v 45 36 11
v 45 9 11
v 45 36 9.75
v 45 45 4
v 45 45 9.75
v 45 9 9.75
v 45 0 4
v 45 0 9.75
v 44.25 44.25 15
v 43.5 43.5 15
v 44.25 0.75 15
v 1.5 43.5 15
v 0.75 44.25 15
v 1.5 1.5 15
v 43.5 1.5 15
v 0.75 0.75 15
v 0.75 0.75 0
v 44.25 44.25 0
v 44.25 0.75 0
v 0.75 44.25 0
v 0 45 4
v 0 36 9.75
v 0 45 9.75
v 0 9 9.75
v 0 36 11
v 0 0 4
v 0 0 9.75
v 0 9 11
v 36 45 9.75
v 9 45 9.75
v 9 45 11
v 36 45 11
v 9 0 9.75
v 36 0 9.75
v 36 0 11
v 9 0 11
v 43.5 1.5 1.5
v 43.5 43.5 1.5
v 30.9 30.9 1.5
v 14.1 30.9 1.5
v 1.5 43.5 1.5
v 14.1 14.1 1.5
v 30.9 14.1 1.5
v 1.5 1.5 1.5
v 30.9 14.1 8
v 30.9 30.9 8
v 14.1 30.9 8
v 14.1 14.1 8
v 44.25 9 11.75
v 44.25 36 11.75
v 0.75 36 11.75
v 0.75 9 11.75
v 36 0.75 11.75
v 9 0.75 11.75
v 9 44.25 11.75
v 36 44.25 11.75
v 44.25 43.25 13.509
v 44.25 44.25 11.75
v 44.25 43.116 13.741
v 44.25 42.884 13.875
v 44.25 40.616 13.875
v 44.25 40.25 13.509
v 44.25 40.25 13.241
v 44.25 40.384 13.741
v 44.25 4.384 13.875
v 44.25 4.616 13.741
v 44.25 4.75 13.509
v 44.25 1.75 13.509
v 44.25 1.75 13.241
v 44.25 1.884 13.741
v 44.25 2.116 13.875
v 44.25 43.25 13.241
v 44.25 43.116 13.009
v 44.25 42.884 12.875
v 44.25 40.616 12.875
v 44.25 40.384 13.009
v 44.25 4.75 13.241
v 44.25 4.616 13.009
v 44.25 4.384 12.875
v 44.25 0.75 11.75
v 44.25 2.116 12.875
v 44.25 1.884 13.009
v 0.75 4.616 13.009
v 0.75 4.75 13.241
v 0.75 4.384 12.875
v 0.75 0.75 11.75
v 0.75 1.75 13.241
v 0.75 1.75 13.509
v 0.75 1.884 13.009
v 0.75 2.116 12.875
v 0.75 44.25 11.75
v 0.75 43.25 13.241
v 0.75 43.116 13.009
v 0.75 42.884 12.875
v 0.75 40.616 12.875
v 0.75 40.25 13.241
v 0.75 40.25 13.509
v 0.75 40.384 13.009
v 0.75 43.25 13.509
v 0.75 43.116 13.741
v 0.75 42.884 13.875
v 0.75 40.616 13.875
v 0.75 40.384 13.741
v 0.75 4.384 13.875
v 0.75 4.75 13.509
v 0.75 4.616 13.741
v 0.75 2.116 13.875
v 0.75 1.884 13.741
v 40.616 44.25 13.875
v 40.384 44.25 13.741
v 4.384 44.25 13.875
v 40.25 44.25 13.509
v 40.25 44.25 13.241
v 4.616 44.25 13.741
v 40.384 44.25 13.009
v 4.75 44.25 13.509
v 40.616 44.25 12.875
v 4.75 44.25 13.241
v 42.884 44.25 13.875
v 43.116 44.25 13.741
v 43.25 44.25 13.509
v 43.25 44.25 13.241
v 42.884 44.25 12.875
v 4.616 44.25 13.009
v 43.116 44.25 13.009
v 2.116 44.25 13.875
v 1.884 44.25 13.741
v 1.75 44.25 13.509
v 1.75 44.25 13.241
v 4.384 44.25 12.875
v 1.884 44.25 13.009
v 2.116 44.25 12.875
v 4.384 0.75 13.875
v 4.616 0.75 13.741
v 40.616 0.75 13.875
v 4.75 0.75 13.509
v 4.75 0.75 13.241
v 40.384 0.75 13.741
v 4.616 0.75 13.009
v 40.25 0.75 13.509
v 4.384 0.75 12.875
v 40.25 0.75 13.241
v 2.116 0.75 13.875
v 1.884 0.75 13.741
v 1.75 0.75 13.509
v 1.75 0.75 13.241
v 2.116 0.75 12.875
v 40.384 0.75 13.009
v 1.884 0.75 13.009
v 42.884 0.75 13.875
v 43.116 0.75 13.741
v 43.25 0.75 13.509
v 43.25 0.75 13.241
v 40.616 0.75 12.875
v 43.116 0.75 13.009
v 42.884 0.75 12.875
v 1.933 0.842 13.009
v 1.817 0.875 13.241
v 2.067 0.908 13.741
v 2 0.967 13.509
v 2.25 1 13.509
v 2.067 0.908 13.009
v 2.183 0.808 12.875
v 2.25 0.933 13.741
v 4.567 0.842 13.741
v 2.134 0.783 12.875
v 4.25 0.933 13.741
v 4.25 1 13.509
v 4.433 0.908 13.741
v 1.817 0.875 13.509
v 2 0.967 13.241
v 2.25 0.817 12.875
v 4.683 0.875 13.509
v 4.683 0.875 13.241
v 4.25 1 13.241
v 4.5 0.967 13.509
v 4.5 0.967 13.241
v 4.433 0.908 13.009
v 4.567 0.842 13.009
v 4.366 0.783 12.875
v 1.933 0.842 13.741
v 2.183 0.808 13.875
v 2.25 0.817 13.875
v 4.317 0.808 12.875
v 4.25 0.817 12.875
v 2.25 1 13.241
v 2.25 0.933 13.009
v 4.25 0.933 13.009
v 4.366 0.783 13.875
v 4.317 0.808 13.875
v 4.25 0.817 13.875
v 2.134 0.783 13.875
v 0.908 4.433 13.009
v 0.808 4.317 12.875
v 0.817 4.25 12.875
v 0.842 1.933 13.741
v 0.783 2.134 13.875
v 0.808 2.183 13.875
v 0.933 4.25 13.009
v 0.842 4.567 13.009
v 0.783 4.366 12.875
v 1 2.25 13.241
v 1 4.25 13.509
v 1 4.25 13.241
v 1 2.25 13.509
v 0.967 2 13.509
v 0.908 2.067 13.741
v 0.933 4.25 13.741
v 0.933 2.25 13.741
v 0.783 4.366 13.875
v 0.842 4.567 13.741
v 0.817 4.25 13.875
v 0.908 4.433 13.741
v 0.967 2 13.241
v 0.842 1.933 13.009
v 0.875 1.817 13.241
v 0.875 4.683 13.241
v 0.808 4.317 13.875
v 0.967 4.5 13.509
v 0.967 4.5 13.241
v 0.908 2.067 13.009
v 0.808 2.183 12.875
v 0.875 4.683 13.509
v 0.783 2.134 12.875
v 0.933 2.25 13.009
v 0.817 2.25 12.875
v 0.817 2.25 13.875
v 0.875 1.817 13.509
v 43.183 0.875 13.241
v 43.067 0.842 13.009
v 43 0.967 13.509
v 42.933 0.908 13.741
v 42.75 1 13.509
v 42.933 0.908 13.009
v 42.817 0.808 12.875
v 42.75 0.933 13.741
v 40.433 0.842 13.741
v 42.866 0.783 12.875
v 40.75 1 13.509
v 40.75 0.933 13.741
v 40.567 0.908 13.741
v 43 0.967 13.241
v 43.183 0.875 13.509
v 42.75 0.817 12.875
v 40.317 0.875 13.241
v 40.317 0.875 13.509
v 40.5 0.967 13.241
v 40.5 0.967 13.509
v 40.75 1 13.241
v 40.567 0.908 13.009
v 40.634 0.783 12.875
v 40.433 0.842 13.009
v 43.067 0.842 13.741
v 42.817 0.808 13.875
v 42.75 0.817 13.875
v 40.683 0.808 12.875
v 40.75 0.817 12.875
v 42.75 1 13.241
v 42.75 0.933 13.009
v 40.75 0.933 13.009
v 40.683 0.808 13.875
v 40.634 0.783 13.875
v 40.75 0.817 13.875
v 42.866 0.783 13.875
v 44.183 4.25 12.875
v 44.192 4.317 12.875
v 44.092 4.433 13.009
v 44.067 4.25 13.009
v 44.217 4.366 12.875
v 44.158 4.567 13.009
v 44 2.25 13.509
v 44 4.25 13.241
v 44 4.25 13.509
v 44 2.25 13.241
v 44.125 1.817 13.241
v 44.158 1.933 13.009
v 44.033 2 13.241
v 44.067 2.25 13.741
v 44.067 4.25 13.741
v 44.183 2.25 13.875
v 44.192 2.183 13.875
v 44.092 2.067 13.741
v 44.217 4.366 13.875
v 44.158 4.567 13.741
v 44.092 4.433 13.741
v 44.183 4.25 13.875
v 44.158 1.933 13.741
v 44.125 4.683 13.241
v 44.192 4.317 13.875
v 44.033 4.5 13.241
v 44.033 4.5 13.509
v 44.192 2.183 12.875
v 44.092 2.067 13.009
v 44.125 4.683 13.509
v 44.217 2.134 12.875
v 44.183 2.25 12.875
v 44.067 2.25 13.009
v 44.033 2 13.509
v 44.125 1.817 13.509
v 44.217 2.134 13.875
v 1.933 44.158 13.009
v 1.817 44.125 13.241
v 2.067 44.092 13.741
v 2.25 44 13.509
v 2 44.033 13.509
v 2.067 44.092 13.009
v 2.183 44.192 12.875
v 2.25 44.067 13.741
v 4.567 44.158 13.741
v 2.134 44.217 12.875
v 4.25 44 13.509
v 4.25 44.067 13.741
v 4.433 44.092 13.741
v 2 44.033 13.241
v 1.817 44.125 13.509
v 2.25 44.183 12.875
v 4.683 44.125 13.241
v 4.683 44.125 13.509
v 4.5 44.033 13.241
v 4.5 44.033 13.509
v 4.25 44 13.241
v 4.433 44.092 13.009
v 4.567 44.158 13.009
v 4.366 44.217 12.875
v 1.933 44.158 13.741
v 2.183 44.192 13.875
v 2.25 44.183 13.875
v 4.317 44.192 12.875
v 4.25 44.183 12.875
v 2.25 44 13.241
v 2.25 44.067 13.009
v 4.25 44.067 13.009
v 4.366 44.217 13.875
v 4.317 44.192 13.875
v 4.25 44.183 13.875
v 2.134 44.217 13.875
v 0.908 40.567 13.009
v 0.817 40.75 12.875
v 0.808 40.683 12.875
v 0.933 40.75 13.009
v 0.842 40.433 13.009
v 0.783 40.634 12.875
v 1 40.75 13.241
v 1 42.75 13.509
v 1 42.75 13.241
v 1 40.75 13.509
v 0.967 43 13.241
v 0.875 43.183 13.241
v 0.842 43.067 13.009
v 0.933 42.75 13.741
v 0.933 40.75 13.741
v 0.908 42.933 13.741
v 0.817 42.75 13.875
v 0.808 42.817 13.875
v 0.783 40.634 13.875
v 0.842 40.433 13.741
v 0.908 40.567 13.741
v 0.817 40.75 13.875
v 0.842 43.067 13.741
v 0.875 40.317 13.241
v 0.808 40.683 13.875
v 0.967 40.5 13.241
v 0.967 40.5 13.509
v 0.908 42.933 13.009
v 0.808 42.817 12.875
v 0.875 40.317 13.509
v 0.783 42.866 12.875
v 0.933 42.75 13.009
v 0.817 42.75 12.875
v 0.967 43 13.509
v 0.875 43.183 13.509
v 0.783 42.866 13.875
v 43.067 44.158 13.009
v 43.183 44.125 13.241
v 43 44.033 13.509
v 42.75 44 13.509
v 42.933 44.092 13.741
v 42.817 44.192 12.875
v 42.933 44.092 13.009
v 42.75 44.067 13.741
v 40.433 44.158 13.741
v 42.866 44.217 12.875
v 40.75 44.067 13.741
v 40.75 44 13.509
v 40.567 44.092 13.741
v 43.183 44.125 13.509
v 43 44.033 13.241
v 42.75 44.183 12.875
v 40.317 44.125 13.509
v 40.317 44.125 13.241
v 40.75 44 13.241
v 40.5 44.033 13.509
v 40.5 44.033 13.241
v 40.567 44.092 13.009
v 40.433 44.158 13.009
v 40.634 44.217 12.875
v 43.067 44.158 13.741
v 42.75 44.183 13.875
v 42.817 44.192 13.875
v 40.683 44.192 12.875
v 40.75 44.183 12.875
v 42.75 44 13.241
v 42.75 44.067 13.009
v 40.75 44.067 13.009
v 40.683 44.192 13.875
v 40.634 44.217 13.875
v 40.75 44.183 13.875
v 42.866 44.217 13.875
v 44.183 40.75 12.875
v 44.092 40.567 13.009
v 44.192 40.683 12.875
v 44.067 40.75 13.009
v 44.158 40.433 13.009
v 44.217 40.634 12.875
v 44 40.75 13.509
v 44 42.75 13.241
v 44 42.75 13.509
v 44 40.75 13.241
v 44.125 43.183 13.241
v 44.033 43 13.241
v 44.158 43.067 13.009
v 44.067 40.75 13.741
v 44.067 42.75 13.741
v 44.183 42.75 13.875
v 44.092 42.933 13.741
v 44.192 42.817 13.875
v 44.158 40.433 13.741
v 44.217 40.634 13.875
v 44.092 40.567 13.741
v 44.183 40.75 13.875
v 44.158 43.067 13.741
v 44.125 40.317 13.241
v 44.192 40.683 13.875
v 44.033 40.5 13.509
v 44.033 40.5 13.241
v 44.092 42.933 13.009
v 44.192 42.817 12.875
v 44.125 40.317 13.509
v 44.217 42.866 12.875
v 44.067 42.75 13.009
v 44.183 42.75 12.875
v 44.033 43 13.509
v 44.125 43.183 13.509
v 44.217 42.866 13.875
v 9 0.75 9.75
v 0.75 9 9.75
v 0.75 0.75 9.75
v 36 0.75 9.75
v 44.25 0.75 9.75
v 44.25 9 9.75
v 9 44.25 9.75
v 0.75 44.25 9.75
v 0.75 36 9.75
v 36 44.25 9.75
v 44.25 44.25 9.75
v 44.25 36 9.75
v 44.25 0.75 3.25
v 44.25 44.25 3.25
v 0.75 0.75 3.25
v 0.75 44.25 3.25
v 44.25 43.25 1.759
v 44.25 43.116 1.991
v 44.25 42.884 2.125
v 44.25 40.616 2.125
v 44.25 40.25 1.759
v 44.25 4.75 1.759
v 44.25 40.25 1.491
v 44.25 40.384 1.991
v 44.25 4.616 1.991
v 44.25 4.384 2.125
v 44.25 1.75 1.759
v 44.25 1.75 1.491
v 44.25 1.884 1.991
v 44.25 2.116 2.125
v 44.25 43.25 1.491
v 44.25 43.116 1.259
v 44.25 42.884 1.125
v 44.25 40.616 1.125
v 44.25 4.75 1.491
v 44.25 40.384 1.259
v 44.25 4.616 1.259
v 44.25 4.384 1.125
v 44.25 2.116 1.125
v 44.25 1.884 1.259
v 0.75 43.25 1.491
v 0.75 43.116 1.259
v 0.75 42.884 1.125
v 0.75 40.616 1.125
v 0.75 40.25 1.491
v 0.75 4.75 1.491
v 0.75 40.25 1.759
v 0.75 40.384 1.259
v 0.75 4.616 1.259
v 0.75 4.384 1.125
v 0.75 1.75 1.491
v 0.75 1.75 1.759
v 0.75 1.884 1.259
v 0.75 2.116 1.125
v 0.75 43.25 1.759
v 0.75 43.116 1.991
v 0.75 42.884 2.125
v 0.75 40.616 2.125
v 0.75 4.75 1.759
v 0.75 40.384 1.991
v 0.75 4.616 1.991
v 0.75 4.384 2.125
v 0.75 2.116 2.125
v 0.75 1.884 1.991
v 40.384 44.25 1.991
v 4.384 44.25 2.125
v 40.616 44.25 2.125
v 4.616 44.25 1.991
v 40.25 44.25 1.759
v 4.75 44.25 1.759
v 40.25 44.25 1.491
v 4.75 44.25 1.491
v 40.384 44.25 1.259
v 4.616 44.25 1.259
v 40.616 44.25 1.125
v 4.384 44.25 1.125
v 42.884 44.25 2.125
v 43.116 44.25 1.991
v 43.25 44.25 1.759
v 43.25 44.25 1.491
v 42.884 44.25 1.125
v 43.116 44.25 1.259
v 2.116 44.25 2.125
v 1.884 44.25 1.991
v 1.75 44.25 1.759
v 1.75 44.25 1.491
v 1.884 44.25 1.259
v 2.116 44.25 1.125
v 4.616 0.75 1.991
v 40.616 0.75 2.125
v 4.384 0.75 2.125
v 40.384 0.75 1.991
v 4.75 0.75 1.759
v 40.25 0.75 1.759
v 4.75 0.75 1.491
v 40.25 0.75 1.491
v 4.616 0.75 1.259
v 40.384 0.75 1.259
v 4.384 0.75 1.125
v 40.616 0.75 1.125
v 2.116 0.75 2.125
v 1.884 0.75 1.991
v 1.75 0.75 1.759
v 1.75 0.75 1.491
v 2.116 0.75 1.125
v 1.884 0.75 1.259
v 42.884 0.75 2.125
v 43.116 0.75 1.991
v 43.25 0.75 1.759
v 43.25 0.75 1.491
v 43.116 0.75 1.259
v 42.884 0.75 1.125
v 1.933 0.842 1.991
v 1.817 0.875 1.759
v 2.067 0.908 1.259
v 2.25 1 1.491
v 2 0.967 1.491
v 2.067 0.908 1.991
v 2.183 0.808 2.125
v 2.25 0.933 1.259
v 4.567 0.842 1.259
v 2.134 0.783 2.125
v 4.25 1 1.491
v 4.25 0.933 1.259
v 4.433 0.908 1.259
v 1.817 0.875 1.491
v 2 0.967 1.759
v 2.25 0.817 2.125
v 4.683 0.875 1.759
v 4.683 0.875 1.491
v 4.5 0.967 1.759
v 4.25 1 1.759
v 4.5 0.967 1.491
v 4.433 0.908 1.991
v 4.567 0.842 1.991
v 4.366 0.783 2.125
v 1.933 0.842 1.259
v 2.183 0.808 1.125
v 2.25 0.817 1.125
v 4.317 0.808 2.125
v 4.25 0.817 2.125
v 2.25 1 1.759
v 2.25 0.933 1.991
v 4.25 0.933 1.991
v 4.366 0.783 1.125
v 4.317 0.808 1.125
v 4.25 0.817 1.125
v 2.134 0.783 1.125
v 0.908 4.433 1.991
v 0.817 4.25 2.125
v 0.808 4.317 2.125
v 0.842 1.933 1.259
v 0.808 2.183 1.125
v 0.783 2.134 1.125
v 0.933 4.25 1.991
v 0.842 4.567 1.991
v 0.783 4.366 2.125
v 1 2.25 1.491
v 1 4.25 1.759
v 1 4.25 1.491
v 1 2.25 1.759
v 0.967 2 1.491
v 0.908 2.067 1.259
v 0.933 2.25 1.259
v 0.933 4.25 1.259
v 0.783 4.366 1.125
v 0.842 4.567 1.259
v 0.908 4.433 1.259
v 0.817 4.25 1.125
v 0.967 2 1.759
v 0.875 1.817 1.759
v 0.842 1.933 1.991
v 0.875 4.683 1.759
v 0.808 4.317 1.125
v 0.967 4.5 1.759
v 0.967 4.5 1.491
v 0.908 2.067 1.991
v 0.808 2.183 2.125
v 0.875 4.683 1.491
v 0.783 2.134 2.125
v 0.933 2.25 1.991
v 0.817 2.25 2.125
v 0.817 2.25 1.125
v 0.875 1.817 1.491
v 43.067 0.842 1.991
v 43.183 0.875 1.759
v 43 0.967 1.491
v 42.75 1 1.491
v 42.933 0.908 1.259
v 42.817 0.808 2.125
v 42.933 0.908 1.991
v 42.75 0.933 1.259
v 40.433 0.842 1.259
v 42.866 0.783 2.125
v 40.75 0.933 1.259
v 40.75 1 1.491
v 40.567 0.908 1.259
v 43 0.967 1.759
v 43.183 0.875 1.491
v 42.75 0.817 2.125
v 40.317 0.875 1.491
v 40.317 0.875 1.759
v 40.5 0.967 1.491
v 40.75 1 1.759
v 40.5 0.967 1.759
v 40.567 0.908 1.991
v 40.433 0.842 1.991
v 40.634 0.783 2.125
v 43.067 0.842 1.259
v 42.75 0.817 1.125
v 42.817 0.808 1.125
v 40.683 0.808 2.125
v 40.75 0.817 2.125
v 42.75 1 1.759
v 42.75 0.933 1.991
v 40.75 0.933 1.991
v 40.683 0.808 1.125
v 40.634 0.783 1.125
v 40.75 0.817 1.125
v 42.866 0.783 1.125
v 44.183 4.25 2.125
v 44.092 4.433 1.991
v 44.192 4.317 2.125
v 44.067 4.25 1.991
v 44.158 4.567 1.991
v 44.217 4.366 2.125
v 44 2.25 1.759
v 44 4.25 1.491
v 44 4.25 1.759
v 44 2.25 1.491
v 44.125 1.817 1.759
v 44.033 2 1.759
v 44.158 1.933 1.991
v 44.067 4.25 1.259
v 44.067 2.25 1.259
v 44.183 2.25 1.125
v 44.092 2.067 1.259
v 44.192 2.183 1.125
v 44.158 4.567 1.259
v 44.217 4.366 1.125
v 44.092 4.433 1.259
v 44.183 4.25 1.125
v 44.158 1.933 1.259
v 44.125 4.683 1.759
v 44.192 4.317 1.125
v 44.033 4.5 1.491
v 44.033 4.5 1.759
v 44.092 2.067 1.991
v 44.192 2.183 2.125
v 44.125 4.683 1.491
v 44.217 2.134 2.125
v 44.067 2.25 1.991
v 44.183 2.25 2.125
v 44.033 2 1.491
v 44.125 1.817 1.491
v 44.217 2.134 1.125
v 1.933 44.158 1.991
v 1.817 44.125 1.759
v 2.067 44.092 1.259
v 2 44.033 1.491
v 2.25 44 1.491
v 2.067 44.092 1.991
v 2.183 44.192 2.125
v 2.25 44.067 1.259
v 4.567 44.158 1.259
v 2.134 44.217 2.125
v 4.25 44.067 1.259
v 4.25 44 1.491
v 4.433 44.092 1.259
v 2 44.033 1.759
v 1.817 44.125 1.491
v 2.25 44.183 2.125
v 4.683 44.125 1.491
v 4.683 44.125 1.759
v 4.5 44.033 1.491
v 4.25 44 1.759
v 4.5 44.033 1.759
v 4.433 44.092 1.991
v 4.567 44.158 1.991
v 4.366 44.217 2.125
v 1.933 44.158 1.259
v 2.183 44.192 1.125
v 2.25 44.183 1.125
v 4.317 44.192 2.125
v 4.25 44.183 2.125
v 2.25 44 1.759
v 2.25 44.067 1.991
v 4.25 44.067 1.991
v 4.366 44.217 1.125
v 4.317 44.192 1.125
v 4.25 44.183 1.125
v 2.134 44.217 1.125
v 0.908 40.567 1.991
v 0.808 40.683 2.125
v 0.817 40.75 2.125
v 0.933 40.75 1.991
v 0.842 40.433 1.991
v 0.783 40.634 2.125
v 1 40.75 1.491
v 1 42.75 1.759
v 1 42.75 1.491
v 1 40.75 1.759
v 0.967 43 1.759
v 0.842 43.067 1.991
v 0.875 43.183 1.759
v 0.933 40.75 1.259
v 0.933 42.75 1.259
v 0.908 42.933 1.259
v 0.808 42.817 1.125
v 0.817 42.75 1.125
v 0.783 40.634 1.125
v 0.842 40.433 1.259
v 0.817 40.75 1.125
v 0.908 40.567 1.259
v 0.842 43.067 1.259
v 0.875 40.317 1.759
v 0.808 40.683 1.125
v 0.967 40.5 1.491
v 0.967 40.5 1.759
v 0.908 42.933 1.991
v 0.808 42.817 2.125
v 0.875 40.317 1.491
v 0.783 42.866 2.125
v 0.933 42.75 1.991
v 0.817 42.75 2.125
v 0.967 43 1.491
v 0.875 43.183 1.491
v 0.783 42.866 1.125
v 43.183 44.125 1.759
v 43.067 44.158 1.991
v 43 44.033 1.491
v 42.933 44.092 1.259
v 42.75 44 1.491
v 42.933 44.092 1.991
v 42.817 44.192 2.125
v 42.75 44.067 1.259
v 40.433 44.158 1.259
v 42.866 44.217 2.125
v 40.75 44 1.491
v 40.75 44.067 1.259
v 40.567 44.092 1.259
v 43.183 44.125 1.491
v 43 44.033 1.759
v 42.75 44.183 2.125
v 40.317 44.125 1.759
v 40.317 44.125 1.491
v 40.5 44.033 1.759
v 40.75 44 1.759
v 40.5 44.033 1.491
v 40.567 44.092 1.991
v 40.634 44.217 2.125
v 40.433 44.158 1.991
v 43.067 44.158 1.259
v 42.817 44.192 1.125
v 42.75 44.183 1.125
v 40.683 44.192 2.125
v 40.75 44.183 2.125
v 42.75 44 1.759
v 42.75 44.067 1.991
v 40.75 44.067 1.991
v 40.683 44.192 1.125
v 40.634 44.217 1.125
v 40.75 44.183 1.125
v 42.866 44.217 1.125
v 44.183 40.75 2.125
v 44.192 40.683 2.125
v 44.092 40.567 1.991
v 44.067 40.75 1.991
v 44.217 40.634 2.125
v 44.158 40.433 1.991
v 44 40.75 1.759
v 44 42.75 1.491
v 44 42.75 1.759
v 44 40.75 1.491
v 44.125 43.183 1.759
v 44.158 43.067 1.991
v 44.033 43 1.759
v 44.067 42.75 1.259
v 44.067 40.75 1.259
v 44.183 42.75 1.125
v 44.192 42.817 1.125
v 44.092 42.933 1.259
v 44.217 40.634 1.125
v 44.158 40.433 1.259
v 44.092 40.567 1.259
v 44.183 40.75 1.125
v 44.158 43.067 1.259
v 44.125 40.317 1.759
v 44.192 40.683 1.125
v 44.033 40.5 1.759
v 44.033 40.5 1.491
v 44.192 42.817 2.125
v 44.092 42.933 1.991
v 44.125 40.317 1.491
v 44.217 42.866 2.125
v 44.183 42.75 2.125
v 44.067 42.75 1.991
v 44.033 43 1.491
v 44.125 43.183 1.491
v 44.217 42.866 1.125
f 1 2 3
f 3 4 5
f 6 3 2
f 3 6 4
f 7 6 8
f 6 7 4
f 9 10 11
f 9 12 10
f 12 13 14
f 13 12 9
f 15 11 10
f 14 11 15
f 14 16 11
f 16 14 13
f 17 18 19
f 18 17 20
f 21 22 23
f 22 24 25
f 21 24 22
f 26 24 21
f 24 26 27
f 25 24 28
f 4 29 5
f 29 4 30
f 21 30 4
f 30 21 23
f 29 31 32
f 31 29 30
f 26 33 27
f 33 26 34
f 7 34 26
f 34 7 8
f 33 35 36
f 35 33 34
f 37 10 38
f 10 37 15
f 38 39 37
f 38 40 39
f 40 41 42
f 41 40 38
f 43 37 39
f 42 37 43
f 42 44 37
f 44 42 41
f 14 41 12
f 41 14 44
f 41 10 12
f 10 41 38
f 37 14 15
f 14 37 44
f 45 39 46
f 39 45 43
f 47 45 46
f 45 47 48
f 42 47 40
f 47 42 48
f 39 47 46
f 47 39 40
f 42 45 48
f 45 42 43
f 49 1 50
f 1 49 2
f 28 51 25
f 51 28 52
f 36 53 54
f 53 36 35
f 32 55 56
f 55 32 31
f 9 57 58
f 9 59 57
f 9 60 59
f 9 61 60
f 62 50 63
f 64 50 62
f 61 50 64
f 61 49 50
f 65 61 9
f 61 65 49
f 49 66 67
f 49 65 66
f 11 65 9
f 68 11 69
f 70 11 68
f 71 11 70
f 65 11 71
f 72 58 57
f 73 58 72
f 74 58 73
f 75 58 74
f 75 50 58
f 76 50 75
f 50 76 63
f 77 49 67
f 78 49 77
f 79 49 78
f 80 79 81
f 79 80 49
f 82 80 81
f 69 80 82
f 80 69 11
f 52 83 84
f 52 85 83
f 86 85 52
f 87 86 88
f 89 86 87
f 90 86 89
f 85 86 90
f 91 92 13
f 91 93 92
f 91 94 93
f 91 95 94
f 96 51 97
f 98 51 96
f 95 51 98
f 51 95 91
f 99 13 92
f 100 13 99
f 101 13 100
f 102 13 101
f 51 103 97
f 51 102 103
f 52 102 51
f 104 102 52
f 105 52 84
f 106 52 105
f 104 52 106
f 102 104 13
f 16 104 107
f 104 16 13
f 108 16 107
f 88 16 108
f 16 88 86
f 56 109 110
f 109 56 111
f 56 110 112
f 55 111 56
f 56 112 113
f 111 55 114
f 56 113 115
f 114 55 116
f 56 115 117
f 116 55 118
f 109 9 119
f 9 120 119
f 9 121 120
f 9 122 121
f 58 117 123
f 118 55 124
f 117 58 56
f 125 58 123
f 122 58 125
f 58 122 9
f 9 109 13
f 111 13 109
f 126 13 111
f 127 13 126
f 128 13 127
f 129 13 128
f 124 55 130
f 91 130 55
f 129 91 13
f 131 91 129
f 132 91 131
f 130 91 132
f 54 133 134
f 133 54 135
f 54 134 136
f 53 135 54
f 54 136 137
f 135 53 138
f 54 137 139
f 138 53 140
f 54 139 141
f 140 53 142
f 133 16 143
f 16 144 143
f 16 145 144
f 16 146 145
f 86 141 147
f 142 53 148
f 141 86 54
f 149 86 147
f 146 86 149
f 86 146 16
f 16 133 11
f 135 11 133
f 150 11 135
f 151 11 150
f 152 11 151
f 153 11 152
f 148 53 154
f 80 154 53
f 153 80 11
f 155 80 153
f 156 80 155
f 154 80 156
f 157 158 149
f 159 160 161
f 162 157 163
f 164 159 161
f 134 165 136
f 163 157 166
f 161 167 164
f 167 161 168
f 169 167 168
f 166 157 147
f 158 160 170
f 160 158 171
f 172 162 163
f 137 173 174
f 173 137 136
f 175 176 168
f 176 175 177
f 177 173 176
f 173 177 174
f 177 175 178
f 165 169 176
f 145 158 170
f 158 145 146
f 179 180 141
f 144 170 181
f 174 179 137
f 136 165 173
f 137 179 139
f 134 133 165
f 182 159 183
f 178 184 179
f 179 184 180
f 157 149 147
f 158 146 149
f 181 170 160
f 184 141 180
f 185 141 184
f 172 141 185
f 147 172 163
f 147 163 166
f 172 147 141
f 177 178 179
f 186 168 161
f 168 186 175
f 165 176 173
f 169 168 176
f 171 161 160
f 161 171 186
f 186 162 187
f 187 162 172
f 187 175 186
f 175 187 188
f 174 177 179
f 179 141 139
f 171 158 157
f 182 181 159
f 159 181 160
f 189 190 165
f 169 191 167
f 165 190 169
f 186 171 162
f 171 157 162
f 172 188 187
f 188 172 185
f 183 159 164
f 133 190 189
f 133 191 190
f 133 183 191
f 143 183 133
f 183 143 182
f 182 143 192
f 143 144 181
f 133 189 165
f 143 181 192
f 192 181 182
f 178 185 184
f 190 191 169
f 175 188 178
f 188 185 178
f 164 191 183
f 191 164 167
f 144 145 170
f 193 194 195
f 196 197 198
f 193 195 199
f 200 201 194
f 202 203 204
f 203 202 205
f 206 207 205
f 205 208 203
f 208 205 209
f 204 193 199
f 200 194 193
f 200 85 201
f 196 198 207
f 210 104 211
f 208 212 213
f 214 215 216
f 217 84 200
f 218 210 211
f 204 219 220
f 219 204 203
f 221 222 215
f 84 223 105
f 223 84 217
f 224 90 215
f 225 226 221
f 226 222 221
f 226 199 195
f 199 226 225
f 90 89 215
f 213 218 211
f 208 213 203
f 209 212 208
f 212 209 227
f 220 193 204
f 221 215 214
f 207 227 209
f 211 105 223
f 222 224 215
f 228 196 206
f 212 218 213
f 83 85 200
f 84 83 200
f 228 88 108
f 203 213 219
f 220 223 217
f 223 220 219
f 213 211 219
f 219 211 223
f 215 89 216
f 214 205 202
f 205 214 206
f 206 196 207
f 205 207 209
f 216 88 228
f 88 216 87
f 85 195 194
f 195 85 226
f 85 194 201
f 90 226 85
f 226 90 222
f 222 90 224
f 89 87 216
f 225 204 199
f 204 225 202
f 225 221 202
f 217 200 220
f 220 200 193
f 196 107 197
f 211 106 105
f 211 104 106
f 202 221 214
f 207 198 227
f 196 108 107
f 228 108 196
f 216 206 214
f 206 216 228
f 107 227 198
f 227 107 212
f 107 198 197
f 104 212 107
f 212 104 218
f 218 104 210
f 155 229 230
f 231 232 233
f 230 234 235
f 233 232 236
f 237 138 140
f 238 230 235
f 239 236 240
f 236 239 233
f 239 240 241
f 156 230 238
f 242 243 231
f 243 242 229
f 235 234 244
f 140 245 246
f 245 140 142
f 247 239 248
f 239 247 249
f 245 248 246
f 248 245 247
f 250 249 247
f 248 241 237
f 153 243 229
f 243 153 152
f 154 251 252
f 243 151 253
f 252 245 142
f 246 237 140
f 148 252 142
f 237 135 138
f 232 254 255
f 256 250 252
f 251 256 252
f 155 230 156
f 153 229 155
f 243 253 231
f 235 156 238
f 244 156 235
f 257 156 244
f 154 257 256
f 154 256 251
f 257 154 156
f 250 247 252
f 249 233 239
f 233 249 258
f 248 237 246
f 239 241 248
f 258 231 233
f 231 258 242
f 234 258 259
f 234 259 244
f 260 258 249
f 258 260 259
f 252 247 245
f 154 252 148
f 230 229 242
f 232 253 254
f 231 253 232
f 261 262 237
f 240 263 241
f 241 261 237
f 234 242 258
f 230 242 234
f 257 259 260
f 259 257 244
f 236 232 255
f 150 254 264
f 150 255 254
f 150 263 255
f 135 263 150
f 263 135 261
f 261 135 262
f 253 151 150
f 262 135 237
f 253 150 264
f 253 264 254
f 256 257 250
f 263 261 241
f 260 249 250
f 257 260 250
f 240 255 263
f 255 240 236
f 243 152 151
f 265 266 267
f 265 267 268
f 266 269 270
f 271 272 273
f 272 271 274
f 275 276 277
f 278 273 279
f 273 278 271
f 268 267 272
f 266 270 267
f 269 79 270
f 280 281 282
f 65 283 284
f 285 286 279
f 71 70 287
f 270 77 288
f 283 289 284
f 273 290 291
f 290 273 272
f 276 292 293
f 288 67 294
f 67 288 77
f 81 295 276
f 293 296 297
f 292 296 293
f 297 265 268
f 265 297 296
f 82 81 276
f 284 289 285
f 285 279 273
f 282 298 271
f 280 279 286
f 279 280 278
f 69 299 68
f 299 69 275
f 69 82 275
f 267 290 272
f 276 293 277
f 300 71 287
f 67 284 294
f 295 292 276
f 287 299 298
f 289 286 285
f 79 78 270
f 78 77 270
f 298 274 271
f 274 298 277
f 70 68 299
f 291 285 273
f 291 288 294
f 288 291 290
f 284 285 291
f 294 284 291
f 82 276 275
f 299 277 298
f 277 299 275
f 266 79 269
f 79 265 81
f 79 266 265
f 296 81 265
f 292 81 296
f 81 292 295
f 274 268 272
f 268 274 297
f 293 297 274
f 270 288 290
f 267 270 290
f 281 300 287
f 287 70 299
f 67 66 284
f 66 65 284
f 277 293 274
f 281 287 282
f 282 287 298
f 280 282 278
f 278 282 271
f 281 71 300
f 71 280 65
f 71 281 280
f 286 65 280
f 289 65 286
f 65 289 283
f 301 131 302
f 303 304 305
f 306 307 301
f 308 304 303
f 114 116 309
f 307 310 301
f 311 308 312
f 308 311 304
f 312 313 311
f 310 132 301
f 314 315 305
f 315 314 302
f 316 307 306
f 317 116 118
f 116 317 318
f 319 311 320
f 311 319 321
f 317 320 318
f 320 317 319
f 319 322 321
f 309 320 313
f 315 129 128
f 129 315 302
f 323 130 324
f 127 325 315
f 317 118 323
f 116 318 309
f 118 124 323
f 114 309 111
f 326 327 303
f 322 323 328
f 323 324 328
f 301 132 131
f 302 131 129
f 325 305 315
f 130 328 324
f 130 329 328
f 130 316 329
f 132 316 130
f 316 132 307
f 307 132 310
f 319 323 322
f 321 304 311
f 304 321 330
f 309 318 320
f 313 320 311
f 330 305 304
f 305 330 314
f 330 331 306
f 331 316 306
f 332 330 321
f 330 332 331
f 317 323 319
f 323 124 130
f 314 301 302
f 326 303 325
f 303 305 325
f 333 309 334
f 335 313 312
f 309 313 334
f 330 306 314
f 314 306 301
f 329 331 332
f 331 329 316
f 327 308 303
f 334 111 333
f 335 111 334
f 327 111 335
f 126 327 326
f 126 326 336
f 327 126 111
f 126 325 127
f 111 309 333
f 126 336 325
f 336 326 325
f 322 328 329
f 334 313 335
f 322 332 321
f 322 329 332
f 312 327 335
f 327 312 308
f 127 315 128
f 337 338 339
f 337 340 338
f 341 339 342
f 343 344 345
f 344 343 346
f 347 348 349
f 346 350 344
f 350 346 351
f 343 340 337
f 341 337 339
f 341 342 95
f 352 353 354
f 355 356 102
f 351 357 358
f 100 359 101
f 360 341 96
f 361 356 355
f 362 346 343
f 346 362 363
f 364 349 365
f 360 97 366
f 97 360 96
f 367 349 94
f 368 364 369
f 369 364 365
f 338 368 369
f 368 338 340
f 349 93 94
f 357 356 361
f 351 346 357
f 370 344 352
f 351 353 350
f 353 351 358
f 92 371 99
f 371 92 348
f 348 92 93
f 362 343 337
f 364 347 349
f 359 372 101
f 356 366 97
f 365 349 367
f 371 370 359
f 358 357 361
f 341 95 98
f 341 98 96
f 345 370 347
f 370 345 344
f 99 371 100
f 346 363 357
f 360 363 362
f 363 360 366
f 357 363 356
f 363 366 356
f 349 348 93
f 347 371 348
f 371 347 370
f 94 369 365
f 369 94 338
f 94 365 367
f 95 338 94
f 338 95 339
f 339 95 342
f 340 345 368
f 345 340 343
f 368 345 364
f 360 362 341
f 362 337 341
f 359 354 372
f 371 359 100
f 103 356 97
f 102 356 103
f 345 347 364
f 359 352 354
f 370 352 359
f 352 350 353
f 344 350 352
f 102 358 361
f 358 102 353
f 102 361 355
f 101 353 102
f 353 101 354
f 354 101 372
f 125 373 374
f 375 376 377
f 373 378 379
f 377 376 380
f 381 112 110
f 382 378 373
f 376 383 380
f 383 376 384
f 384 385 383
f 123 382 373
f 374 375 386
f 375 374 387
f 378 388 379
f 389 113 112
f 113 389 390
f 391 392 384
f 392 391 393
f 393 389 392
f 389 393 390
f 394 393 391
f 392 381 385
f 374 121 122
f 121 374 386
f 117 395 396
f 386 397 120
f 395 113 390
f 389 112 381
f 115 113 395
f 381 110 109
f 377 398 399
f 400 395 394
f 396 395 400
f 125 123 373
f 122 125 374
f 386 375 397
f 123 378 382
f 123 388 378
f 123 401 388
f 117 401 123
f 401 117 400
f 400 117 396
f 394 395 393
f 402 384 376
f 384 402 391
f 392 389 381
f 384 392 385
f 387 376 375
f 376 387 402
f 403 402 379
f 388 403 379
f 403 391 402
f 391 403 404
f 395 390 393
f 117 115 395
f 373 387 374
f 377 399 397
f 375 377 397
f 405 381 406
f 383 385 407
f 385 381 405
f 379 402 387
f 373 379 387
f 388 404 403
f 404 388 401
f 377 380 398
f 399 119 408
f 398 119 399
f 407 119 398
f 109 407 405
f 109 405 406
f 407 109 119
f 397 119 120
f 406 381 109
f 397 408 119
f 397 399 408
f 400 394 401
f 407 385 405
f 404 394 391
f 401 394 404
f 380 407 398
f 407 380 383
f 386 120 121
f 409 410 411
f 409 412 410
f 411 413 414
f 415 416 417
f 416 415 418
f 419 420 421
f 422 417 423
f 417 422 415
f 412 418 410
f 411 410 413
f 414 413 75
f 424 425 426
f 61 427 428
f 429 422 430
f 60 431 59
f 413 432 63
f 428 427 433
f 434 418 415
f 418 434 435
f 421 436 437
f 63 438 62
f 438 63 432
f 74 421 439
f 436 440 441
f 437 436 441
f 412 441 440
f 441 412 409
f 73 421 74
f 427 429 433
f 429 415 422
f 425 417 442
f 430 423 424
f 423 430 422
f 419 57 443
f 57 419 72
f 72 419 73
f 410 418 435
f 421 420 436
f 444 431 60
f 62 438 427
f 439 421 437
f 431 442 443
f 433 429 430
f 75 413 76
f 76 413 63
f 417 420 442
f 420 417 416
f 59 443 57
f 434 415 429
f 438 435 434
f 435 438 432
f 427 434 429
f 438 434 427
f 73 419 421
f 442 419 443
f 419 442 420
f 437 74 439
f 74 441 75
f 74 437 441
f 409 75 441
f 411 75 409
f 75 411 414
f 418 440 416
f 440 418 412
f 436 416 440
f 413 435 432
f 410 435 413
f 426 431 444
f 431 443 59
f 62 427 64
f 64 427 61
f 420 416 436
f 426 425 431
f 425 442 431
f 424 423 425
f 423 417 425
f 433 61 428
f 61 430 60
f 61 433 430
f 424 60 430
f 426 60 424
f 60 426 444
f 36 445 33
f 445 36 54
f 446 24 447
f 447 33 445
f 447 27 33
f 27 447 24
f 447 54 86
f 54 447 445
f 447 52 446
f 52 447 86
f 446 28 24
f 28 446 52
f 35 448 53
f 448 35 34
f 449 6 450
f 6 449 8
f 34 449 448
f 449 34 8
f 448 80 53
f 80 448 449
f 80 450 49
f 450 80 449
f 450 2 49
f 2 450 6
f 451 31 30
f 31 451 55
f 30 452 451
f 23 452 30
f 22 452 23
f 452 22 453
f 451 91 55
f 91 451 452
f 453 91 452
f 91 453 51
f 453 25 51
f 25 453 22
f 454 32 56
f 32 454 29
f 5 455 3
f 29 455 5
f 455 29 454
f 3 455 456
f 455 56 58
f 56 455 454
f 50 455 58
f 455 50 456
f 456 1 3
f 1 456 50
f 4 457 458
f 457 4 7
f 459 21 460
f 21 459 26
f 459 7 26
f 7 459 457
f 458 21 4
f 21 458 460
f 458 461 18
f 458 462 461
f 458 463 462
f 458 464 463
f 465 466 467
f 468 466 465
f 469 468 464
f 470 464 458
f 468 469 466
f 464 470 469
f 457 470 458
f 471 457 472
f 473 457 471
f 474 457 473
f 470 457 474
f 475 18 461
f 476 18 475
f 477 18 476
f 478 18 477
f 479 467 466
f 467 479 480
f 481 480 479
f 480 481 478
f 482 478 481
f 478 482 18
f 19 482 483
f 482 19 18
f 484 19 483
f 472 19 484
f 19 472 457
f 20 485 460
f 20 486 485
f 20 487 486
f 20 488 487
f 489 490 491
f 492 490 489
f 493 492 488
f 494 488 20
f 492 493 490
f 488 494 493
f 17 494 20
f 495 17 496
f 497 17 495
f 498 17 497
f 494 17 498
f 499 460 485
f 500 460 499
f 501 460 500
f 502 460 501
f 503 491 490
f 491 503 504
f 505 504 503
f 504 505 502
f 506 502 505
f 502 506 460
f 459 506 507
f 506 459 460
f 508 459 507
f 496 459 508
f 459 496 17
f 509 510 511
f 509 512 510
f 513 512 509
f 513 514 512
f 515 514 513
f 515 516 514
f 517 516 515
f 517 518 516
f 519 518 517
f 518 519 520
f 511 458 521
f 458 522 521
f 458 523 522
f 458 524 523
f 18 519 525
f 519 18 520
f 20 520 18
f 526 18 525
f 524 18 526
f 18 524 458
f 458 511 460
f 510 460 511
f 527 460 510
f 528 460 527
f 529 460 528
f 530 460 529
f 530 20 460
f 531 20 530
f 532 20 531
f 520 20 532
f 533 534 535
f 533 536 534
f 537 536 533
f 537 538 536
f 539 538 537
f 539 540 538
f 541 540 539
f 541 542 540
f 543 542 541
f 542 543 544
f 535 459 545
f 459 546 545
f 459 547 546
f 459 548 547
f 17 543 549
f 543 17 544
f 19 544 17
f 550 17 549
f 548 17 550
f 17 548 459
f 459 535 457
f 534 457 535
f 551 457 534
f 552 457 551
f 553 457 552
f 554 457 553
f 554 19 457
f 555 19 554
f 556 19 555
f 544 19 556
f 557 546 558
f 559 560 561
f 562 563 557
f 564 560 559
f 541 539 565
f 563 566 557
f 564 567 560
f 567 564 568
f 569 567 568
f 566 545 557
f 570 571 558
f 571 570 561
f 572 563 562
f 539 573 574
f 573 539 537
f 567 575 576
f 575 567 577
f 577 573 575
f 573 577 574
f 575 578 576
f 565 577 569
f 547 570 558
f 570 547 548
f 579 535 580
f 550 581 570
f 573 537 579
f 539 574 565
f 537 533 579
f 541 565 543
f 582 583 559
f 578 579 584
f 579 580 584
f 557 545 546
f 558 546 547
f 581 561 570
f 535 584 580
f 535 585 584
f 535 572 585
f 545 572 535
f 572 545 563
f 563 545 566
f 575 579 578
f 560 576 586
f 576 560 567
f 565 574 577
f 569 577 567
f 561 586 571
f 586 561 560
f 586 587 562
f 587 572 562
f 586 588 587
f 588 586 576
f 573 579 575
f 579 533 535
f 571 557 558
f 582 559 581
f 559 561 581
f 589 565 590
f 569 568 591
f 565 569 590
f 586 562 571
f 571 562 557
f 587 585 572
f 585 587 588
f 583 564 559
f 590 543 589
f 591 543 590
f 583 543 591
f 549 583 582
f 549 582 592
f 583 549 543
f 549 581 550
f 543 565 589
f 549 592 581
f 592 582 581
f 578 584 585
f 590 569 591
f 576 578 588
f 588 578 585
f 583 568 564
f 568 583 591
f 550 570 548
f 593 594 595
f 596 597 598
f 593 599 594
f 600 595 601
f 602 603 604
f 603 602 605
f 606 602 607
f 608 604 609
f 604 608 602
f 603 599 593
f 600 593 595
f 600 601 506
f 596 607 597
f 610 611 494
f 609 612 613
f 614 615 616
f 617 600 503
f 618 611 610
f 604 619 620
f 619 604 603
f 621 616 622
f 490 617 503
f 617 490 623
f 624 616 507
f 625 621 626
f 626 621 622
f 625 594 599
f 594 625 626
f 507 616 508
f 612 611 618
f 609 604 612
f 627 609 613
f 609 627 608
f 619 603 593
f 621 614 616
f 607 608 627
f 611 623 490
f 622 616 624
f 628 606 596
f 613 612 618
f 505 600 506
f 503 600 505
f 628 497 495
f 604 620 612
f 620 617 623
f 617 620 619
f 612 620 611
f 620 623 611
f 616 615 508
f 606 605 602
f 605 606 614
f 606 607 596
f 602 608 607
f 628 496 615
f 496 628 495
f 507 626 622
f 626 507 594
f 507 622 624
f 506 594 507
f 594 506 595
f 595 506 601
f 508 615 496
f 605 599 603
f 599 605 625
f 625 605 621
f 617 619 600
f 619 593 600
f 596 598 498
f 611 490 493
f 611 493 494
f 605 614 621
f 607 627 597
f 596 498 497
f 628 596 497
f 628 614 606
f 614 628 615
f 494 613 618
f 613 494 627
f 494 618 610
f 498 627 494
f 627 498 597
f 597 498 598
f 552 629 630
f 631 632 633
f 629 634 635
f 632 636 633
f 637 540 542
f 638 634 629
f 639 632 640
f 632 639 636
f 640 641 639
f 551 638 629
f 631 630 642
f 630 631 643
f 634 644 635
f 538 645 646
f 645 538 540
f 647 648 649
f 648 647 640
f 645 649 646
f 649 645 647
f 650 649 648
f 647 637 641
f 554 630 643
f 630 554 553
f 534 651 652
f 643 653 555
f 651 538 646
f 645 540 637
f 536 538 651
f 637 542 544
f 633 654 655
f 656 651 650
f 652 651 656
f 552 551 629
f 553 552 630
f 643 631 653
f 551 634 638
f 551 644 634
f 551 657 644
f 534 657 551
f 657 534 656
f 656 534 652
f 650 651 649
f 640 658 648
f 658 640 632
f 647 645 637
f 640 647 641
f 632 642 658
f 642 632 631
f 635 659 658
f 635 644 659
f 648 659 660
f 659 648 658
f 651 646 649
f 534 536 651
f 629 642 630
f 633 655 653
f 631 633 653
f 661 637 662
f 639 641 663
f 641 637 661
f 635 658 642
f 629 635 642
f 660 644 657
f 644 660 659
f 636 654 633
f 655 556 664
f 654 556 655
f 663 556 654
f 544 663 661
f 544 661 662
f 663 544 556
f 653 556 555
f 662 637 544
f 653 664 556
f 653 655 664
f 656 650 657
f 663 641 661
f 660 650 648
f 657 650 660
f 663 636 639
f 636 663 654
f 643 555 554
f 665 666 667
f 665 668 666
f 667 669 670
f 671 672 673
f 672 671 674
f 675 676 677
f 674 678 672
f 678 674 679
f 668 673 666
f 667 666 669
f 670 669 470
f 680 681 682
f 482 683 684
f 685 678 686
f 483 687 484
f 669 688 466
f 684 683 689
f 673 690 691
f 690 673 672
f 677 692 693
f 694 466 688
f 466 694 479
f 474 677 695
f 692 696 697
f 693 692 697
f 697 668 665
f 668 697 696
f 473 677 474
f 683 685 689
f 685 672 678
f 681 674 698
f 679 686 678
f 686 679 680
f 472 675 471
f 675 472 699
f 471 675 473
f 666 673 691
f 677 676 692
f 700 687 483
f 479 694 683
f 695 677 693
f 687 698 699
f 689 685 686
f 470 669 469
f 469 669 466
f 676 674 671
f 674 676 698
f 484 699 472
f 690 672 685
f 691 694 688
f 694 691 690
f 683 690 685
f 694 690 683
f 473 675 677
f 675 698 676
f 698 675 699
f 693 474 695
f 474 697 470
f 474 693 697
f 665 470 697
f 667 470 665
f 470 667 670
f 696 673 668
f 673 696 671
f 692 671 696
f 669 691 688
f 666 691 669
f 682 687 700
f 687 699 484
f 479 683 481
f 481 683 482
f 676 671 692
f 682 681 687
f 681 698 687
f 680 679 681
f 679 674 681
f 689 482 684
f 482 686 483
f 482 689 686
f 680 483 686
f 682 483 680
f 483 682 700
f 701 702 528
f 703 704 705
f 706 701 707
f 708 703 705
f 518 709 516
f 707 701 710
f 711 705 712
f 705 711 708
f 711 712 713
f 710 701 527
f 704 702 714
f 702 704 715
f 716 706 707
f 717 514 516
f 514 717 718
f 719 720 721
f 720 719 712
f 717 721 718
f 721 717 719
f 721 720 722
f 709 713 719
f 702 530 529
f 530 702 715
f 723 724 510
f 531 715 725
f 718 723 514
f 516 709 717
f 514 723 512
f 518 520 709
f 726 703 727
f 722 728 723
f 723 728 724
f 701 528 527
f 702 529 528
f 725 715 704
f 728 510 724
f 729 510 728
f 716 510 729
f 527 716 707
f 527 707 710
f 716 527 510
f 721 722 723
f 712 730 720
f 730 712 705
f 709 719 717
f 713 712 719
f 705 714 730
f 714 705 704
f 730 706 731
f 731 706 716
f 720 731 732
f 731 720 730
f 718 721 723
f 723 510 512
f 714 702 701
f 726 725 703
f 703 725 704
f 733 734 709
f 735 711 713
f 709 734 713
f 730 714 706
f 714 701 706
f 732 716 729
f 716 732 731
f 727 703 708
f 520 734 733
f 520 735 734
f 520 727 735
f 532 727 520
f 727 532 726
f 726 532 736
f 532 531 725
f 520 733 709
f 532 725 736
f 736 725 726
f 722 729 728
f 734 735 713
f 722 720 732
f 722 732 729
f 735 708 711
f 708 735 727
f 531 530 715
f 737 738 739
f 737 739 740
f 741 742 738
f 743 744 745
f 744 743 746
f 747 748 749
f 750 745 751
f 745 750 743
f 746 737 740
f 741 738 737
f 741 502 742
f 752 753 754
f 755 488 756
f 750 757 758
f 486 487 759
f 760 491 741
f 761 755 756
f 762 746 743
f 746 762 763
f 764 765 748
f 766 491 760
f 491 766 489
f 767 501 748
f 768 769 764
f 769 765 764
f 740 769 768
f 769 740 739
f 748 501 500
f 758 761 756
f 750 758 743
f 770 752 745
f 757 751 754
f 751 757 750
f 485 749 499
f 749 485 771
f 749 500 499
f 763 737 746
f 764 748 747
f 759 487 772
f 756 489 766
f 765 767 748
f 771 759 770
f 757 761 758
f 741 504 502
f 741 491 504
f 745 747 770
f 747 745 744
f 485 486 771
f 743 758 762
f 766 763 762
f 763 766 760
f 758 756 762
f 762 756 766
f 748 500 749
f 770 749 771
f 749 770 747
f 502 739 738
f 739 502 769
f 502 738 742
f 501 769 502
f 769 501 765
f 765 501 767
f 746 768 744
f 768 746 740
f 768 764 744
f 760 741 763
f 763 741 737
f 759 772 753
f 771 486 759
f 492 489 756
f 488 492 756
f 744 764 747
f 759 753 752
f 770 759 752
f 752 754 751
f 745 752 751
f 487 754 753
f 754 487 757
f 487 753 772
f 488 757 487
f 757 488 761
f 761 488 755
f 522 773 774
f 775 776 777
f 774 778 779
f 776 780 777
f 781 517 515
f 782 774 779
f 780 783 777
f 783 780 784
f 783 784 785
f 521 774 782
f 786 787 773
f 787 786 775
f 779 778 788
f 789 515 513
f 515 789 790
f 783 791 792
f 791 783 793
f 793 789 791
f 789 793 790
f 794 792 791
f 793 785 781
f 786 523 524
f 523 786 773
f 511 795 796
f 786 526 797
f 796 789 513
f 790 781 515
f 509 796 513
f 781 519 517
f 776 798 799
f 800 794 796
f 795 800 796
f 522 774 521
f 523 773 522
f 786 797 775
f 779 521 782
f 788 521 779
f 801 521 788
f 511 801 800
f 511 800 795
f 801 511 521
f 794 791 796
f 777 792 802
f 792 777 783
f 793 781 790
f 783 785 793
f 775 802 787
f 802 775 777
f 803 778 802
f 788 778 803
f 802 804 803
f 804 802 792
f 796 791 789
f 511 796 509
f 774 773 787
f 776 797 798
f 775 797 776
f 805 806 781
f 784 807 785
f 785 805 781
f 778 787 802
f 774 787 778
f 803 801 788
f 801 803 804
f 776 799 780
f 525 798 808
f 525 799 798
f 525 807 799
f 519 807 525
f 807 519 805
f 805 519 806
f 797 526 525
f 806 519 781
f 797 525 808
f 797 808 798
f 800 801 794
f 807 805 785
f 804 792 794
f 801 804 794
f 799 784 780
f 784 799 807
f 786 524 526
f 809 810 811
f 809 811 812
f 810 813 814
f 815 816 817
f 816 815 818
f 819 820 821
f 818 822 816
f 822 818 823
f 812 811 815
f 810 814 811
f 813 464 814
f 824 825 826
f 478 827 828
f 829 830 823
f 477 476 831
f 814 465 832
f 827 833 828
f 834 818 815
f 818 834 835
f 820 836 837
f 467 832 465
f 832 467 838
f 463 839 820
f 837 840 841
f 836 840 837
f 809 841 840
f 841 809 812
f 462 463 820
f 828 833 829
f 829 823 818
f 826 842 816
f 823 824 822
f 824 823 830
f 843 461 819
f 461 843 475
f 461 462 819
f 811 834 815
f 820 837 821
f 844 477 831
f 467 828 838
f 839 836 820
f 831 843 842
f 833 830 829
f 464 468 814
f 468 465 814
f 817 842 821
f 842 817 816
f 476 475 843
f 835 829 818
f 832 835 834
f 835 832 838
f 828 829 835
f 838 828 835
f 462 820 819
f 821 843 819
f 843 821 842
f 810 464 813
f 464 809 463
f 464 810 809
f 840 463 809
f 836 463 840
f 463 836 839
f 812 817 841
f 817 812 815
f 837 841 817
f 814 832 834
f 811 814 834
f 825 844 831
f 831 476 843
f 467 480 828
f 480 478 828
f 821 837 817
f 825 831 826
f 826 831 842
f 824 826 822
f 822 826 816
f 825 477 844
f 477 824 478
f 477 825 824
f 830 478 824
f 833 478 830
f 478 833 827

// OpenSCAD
// Test: Pedestal base — CMP_PEDESTAL_BASE_B (push-down feature for cards)
include <../boardgame_insert_toolkit_lib.4.scad>;

g_b_print_lid = false;
g_b_print_box = true;
g_isolated_print_box = "";

data = [
    [ "pedestal base",
        [
            [ BOX_SIZE_XYZ, [45, 45, 15] ],
            [ BOX_COMPONENT,
                [
                    [ CMP_COMPARTMENT_SIZE_XYZ, [42, 42, 7] ],
                    [ CMP_PEDESTAL_BASE_B, t ],
                ]
            ]
        ]
    ],
];

MakeAll();
